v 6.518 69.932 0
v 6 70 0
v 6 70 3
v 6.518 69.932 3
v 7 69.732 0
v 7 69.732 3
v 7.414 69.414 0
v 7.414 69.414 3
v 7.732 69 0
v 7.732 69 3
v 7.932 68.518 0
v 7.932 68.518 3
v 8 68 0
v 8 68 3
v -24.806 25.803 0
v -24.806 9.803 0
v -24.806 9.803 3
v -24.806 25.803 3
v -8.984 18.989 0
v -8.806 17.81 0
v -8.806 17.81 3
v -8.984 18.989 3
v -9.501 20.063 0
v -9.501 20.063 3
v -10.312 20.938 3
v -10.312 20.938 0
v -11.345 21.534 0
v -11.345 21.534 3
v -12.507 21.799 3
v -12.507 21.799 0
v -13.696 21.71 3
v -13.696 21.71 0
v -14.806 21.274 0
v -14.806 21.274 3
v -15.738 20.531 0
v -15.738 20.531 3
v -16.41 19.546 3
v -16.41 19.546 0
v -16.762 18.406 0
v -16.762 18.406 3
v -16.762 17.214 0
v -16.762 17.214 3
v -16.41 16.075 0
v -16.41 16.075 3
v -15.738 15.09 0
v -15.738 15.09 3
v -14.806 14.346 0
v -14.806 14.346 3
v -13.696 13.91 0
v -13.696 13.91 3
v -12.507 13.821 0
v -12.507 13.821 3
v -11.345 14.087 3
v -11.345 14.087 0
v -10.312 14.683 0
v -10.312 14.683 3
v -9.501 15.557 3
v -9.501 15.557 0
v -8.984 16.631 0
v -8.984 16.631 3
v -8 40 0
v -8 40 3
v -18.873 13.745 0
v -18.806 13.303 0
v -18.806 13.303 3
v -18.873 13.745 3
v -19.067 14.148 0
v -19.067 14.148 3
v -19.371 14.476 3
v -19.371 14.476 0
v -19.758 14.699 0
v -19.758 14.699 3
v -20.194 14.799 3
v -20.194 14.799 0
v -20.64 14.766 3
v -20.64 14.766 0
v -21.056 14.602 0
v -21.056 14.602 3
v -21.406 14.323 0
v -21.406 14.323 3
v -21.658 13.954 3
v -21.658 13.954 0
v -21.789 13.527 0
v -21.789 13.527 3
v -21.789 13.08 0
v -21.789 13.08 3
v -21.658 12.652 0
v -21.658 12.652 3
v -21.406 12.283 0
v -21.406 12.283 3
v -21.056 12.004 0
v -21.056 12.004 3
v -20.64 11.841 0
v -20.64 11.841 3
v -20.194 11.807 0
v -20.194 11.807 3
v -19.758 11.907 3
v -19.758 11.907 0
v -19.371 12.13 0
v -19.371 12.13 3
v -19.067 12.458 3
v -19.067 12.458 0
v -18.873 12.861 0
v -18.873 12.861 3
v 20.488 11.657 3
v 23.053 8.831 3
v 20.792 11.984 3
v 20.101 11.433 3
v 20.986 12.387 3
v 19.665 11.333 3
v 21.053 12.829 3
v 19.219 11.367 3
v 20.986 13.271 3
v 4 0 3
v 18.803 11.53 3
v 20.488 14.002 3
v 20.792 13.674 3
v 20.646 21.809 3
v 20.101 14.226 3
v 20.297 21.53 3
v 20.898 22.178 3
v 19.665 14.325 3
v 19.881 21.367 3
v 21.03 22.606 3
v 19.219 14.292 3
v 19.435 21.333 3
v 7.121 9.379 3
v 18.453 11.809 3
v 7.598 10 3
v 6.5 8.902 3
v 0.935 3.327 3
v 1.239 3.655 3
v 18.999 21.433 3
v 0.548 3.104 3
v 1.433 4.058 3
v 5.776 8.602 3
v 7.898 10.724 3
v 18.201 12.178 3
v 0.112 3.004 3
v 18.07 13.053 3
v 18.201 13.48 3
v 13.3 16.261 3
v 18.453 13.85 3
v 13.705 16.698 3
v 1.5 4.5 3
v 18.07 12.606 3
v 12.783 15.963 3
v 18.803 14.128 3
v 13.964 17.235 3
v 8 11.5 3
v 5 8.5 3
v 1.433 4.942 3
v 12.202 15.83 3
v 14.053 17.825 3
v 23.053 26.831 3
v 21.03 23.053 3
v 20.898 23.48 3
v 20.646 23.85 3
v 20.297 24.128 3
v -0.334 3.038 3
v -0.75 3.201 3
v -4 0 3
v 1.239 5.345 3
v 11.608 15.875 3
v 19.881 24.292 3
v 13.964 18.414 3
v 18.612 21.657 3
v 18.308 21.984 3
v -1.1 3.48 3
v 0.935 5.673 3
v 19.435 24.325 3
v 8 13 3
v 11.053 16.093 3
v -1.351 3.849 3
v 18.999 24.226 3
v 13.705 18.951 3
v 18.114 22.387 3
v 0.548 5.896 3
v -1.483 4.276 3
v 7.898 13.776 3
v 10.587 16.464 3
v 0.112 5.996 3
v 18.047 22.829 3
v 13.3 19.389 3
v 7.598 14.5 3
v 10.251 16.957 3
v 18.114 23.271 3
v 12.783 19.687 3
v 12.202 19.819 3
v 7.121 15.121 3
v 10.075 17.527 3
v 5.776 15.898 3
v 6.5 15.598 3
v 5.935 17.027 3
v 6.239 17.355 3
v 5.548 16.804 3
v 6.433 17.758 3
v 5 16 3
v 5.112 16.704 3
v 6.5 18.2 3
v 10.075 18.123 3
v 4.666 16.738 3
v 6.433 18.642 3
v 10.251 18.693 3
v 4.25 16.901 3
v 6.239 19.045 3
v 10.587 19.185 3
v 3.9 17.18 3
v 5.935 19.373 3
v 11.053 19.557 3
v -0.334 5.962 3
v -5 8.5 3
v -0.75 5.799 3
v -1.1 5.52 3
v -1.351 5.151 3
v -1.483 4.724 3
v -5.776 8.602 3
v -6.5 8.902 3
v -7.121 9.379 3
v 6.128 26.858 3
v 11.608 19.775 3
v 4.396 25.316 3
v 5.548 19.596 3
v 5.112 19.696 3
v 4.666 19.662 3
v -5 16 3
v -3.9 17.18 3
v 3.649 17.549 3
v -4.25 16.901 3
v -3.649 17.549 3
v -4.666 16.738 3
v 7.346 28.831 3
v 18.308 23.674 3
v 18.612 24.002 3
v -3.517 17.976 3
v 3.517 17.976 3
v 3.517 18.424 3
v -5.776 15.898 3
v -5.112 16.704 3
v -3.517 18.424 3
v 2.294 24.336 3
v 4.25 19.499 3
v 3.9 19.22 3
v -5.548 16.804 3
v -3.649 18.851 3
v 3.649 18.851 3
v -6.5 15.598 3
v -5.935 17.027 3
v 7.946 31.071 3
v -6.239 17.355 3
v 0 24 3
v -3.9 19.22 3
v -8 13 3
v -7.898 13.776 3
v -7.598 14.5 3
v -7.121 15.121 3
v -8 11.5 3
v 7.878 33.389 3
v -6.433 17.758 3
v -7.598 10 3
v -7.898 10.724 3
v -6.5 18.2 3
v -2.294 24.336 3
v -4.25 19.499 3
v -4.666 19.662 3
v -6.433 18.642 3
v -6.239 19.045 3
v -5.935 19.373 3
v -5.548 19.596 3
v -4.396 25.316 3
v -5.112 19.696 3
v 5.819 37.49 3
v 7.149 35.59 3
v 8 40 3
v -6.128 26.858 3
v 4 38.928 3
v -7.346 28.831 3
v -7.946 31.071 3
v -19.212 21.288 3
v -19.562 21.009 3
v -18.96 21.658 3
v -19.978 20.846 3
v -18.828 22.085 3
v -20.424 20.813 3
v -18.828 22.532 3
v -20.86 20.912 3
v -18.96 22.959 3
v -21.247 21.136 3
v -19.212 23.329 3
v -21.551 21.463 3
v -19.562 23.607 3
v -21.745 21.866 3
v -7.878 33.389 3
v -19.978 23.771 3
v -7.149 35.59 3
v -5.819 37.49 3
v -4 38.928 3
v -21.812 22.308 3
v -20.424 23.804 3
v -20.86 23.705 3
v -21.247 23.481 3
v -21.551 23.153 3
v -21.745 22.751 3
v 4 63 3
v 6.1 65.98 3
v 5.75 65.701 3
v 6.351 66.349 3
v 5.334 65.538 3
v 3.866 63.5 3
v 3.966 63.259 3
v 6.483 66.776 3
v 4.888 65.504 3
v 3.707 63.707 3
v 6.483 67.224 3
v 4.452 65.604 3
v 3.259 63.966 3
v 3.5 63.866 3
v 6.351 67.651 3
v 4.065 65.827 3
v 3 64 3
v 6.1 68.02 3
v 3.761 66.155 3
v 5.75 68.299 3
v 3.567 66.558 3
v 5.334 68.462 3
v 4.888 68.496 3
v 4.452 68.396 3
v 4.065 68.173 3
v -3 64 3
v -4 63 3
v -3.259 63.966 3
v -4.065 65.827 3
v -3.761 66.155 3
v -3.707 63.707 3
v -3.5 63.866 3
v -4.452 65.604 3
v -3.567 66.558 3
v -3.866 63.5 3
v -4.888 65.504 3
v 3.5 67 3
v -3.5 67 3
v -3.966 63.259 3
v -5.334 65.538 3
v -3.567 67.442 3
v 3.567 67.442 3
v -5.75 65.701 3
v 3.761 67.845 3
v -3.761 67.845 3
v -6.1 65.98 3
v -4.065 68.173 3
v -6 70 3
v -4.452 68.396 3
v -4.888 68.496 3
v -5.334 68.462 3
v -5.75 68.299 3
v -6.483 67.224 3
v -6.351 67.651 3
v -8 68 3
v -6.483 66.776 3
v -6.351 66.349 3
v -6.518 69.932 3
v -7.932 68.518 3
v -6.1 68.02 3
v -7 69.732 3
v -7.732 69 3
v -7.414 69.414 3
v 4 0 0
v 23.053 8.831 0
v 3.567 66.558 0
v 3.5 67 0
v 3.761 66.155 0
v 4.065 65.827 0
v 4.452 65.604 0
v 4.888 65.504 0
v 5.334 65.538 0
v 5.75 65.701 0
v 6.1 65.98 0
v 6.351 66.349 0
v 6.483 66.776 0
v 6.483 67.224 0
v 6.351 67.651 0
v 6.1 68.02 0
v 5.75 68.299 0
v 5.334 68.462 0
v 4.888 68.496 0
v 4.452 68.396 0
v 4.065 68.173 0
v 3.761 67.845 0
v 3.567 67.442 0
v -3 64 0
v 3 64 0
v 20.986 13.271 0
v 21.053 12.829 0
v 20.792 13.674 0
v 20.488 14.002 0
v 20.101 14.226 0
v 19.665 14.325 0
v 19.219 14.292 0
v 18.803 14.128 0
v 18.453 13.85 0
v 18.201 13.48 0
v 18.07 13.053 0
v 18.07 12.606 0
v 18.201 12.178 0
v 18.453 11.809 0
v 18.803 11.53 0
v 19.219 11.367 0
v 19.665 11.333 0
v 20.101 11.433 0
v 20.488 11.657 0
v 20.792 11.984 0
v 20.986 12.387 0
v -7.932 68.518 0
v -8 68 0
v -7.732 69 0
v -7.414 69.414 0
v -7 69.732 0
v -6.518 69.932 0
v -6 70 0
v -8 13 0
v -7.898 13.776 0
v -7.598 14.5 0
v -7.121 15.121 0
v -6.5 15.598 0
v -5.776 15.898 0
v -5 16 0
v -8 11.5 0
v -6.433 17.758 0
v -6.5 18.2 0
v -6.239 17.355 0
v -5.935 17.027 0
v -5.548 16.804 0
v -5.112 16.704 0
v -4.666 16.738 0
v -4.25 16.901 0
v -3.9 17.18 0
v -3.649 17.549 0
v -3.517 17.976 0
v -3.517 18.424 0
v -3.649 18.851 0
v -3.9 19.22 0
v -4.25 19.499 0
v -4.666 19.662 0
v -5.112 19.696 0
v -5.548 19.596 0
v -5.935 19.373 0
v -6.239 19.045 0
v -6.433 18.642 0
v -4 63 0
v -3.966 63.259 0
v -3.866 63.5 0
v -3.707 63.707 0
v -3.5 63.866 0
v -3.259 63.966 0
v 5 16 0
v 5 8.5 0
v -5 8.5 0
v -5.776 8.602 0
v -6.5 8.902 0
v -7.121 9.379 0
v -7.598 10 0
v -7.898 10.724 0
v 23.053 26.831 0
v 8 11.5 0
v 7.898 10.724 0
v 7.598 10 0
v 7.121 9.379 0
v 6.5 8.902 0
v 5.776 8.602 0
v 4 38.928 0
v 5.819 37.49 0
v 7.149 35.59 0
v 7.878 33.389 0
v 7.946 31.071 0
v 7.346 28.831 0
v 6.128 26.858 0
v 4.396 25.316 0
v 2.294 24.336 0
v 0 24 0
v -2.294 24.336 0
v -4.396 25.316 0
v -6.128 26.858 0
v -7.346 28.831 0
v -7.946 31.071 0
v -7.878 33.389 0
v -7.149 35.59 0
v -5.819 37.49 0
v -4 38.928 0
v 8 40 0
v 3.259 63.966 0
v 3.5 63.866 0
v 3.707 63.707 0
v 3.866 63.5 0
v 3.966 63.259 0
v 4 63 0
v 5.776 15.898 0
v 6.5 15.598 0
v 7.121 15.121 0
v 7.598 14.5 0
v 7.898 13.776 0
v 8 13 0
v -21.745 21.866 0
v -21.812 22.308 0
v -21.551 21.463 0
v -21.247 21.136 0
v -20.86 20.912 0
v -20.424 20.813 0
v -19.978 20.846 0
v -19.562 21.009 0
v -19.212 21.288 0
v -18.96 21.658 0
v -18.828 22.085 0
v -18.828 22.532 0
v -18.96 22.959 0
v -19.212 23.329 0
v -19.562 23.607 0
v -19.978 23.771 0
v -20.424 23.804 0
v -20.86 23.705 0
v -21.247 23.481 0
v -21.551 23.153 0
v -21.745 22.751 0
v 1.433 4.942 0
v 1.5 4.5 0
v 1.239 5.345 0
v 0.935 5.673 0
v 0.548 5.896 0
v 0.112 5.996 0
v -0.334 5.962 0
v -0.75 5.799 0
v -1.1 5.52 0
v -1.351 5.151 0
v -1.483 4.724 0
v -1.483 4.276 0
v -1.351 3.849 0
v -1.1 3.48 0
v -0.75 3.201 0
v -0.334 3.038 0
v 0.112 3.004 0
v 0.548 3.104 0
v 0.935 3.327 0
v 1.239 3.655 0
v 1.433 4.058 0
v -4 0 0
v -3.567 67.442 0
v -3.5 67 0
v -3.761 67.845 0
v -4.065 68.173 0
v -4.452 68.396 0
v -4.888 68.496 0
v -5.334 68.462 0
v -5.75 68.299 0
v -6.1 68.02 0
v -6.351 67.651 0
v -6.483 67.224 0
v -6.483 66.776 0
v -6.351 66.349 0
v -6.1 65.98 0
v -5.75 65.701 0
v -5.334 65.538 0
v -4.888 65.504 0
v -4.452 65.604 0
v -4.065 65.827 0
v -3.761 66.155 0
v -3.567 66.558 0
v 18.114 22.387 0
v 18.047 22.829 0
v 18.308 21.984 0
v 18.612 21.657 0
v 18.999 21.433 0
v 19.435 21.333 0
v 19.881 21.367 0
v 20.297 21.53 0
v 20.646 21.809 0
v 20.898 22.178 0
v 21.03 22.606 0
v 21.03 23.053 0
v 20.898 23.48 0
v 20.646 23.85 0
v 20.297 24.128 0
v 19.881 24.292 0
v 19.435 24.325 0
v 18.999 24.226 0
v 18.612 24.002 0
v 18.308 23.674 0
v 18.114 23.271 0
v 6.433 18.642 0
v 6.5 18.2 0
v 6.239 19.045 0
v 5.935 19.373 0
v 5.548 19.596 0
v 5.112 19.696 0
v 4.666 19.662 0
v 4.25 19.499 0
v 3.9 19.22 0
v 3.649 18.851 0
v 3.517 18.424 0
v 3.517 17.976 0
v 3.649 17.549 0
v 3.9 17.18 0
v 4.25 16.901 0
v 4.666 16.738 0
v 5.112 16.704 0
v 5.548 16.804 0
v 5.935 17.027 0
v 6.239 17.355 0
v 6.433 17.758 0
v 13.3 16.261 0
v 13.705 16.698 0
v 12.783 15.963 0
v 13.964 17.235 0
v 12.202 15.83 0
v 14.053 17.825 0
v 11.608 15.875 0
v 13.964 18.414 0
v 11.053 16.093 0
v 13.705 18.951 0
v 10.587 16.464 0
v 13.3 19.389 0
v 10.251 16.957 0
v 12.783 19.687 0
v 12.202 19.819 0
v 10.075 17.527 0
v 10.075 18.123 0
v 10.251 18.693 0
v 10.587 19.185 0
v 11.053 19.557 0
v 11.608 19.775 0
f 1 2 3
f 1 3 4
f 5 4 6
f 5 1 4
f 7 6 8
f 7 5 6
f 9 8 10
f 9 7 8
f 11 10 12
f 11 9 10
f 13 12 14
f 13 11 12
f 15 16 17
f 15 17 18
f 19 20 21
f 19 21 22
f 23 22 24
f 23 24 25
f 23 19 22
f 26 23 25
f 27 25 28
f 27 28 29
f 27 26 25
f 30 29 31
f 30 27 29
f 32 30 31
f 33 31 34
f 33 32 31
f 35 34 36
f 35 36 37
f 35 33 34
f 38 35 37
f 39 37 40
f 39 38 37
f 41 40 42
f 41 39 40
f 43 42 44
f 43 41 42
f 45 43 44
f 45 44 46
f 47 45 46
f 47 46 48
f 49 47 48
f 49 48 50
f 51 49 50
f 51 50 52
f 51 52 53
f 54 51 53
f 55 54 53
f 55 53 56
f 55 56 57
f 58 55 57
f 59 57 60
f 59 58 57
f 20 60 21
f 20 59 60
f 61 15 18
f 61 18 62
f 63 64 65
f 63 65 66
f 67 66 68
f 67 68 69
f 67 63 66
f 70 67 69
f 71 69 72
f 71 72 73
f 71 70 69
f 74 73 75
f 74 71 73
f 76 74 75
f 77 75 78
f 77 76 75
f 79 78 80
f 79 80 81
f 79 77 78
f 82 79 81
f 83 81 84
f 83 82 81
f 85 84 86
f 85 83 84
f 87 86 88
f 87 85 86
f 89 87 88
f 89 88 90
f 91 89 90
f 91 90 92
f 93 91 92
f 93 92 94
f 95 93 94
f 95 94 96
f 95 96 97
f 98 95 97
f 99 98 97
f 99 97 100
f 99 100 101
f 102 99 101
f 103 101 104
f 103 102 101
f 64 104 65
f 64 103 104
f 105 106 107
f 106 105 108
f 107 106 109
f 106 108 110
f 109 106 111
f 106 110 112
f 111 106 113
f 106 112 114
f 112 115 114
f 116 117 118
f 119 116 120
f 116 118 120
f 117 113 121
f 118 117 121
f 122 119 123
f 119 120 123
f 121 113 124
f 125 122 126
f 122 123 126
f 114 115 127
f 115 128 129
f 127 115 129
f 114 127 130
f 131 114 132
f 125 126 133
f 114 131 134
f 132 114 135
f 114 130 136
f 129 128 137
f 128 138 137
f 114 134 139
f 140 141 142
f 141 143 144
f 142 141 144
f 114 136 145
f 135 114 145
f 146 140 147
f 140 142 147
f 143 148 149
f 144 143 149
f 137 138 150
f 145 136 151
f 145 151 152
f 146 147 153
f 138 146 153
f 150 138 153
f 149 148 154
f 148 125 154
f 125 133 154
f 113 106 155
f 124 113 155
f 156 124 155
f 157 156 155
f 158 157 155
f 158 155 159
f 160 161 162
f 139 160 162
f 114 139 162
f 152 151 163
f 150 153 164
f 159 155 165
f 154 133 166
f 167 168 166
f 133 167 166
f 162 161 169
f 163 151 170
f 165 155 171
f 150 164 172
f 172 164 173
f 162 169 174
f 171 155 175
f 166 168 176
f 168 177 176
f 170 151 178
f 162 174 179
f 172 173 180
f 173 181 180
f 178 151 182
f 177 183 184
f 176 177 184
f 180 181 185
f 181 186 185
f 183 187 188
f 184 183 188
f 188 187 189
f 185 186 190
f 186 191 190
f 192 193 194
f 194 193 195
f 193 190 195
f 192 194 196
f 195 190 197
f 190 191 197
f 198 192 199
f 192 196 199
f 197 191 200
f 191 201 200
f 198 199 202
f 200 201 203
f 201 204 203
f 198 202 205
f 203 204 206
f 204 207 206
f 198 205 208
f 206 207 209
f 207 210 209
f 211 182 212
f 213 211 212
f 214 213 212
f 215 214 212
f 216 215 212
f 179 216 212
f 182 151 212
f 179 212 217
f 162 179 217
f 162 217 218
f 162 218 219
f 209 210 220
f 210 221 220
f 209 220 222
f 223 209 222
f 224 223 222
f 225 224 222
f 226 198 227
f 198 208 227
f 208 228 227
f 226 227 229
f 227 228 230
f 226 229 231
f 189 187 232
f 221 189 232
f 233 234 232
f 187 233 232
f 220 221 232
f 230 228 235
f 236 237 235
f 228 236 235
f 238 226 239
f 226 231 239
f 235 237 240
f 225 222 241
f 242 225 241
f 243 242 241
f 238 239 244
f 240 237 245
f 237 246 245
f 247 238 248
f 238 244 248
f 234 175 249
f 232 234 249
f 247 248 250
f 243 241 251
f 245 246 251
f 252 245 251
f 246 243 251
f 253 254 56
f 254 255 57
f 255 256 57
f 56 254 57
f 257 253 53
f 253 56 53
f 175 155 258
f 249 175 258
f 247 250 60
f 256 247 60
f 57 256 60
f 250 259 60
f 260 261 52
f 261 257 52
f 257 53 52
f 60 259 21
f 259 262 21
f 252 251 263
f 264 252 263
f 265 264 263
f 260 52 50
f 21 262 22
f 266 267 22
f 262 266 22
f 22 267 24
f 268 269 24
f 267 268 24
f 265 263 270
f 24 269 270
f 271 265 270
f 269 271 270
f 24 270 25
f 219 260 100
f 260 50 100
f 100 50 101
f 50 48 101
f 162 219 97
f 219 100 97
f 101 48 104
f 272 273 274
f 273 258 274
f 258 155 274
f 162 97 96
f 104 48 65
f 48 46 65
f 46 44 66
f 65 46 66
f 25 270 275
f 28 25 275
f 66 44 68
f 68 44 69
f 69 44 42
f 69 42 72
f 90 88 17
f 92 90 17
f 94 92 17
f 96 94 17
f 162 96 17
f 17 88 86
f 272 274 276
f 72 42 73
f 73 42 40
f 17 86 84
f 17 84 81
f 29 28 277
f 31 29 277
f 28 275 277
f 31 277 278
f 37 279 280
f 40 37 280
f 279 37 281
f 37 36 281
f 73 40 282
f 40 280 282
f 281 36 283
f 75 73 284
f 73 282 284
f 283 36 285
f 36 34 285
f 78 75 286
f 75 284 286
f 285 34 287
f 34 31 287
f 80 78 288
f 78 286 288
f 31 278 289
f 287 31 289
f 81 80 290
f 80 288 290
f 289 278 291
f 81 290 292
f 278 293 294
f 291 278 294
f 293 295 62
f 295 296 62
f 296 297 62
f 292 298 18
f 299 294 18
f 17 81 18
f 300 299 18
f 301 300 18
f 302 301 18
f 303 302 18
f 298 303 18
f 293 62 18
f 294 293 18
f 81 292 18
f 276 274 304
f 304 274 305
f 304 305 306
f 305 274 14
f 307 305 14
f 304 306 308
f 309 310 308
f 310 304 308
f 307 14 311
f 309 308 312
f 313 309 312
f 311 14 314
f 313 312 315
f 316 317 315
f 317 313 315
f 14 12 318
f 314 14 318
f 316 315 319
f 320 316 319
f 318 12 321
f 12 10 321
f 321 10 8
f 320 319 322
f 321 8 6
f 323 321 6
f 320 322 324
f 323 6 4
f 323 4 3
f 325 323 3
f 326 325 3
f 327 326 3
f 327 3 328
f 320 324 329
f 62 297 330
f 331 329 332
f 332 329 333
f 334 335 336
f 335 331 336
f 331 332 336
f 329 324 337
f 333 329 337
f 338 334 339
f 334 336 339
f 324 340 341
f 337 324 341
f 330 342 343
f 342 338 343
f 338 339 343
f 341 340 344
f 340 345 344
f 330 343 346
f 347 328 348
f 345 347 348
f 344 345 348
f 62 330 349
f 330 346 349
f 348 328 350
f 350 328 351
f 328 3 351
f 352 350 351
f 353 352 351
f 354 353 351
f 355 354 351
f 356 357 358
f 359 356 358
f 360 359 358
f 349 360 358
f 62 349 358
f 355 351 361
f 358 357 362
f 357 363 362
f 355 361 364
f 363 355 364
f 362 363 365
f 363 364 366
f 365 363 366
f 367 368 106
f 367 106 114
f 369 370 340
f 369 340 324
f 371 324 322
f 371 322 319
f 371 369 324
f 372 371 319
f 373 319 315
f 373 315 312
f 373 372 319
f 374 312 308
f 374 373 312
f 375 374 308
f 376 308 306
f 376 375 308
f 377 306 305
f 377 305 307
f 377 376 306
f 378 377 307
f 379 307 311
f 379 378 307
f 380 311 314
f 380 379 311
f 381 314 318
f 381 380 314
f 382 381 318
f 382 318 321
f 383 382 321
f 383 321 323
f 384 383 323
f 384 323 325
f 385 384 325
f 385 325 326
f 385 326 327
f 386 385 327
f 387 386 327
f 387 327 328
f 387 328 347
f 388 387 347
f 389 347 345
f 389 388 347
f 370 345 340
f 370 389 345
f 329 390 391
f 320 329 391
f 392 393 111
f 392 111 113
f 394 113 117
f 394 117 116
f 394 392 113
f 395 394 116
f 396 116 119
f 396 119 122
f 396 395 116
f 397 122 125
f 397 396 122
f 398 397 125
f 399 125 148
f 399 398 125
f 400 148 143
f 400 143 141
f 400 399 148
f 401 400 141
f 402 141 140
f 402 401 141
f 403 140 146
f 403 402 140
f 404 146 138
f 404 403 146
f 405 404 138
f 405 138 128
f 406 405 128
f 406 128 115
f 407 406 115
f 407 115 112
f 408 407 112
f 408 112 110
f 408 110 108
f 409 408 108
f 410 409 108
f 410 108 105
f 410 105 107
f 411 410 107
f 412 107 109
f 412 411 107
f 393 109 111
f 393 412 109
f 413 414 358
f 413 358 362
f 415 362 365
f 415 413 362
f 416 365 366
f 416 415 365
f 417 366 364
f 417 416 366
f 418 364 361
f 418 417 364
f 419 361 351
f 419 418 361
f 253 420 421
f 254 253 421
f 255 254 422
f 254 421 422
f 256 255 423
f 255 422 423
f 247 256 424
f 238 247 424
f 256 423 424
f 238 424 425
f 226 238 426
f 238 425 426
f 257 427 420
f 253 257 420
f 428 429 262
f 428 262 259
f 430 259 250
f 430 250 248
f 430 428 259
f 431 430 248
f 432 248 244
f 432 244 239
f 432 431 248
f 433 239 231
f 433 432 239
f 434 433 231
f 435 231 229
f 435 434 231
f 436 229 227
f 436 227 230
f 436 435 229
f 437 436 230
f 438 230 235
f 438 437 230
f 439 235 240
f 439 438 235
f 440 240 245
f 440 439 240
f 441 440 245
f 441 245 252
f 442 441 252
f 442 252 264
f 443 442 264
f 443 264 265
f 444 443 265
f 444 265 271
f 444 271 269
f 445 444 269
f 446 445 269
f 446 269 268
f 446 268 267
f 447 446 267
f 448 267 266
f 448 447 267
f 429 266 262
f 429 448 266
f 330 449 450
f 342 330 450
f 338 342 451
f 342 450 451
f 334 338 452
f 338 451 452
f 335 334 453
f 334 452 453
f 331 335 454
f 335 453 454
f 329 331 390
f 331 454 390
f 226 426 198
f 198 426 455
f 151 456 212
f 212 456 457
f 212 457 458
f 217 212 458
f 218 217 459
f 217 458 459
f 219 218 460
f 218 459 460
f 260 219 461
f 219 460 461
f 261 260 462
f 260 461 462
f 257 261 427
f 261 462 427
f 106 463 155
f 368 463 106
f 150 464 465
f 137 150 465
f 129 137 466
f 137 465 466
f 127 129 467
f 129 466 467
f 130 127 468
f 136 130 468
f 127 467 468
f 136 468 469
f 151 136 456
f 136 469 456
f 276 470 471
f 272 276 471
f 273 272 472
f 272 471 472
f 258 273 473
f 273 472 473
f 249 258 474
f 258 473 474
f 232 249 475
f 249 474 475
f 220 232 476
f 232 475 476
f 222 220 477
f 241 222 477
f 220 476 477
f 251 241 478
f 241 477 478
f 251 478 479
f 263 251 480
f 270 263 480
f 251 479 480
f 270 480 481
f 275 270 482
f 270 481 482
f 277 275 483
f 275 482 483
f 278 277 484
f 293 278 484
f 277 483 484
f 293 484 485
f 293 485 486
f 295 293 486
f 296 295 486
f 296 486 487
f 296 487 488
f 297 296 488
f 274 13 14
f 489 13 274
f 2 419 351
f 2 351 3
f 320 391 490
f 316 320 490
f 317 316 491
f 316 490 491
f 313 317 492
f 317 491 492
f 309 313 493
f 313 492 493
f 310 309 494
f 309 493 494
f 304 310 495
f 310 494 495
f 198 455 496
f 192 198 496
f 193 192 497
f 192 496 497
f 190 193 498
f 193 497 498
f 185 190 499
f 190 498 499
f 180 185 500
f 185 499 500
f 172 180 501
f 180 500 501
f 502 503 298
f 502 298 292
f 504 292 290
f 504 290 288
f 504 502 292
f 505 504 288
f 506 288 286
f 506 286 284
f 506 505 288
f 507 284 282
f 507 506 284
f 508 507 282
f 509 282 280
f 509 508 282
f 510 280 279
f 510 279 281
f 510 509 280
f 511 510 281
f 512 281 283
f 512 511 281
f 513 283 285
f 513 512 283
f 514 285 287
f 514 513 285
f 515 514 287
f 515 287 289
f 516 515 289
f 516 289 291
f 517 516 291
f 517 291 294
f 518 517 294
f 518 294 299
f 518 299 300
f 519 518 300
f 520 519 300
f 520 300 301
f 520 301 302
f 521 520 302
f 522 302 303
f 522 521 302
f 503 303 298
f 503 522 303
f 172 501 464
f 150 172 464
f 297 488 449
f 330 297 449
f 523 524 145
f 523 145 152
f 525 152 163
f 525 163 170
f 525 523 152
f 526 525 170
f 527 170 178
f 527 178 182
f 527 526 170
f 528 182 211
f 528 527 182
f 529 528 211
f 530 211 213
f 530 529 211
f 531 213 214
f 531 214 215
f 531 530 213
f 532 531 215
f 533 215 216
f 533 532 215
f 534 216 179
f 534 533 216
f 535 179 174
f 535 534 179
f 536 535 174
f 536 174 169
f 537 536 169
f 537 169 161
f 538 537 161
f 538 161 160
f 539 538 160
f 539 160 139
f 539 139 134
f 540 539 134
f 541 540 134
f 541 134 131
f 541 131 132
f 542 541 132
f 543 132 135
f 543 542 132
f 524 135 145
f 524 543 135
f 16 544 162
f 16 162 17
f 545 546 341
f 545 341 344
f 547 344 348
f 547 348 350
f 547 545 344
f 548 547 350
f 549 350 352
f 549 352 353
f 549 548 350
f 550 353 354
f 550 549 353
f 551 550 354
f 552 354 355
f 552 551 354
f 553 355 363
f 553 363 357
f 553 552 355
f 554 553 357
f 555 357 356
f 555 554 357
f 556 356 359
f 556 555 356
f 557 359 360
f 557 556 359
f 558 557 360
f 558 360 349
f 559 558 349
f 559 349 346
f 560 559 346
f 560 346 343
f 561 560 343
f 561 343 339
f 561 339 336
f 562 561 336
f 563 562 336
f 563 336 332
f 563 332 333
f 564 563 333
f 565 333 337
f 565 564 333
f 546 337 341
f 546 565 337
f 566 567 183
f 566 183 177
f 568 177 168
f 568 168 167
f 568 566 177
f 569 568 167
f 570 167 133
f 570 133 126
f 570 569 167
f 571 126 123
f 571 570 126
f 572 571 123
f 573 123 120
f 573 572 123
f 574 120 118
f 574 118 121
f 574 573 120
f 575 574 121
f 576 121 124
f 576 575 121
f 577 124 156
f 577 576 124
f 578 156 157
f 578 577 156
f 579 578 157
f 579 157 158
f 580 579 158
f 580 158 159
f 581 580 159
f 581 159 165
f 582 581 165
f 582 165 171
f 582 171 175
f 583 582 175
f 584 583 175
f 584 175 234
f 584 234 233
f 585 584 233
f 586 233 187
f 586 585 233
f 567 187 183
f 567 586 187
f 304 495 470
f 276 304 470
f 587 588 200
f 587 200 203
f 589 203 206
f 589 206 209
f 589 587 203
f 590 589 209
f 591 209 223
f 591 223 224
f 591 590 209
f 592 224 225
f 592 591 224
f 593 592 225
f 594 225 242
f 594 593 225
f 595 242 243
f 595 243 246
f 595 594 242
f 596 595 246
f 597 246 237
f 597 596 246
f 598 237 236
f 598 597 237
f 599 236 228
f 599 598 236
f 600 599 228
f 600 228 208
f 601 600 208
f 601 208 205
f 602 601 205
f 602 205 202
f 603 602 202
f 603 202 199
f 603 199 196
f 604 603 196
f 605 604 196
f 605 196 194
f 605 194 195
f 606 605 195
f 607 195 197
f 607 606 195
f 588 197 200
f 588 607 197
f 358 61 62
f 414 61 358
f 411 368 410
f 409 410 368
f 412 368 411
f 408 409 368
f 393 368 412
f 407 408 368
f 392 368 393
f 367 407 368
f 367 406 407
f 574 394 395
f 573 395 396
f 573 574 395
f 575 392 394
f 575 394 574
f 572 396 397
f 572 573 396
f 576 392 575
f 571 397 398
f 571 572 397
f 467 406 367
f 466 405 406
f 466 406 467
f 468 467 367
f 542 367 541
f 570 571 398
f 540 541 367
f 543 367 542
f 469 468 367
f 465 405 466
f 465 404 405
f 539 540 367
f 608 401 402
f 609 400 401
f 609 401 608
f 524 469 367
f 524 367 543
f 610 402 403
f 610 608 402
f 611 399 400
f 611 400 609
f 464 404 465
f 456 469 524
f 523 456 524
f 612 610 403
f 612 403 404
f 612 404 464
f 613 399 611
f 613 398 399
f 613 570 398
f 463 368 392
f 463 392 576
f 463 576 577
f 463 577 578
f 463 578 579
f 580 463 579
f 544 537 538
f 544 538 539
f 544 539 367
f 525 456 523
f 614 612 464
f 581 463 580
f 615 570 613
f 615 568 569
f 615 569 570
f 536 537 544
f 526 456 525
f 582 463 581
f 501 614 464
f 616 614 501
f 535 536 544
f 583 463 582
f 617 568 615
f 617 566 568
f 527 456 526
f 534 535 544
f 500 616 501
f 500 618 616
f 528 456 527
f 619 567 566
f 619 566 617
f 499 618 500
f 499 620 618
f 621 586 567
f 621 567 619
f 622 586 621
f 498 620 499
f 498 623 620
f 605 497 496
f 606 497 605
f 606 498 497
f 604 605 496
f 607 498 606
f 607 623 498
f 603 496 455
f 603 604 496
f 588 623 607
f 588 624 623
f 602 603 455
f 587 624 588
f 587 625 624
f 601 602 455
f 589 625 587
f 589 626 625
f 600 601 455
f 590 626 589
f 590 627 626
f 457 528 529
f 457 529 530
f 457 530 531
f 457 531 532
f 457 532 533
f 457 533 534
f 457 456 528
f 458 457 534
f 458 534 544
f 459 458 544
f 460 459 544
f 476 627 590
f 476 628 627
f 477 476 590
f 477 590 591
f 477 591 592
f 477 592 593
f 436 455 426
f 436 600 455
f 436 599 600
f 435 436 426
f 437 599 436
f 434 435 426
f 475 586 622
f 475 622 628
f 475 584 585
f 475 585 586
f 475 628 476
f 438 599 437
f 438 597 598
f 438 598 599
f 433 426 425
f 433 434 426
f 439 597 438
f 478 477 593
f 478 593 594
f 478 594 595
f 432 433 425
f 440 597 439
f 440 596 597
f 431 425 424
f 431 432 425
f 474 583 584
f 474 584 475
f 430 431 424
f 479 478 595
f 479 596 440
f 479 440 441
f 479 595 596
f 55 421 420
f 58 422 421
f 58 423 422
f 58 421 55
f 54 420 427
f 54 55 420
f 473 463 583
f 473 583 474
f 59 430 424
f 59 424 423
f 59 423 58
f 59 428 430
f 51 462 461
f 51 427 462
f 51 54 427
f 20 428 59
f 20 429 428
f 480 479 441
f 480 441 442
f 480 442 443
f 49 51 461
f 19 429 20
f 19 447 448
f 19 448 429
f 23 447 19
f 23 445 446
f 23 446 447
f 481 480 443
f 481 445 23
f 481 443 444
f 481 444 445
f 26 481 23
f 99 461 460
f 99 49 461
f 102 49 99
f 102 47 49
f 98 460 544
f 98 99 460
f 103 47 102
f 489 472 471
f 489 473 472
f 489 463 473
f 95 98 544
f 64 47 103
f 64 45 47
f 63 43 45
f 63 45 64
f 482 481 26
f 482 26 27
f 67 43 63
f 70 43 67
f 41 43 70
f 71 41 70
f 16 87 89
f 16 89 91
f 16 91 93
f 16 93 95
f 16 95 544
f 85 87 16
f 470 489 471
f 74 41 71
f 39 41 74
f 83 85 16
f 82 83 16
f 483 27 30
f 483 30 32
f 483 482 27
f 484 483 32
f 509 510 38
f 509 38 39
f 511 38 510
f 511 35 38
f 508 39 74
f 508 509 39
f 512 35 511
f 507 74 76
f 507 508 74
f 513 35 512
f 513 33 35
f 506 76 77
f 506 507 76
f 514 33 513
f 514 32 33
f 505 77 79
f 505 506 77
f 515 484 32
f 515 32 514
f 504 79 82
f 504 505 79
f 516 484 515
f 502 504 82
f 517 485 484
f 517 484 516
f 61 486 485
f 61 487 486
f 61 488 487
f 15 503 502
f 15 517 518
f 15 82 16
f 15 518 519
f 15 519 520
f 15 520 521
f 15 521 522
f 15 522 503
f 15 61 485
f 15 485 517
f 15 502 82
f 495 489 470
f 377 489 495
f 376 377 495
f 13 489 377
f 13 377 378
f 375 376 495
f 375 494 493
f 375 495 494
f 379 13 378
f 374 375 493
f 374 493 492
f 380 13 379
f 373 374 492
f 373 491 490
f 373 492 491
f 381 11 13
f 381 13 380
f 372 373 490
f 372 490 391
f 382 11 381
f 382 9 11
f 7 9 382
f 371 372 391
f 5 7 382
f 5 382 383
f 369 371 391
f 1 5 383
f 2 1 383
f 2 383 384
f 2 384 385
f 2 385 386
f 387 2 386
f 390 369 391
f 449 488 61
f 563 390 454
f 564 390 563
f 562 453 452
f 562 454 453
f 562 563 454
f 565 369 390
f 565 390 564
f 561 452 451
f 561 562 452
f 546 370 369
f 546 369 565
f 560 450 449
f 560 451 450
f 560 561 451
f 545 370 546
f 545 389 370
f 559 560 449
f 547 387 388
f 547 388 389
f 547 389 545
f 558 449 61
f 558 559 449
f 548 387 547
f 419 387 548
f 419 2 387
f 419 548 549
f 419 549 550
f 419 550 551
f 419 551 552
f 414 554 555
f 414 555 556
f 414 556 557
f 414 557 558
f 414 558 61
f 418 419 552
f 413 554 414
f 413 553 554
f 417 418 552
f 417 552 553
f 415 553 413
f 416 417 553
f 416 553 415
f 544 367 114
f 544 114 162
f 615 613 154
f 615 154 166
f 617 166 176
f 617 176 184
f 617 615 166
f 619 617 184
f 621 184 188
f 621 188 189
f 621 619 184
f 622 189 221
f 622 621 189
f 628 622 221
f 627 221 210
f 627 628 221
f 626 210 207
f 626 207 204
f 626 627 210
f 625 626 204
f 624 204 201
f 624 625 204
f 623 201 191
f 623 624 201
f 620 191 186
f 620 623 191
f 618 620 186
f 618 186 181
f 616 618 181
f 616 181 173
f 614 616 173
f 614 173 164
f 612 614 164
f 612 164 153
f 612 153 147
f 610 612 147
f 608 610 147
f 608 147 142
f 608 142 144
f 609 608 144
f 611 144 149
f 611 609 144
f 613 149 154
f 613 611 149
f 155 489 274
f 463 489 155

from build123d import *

# Parameters (mm, degrees)
SKETCH1_R           = 1.5
SKETCH1_R_2         = 4
SKETCH1_R_3         = 2
BOSS_EXTRUDE1_DEPTH = 3


with BuildPart() as part:
    # Sketch1 → Boss-Extrude1 (new body)
    with BuildSketch(Plane.XY):
        with BuildLine():
            Line((-6, 70), (6, 70))
            ThreePointArc((6, 70), (7.414213562, 69.414213562), (8, 68))
            Line((8, 68), (8, 40))
            Line((8, 40), (23.052765378, 26.831315386))
            Line((23.052765378, 26.831315386), (23.052765378, 8.831315386))
            Line((23.052765378, 8.831315386), (4, 0))
            Line((4, 0), (-4, 0))
            Line((-4, 0), (-24.806216128, 9.803130645))
            Line((-24.806216128, 9.803130645), (-24.806216128, 25.803130645))
            Line((-24.806216128, 25.803130645), (-8, 40))
            Line((-8, 40), (-8, 68))
            ThreePointArc((-8, 68), (-7.414213562, 69.414213562), (-6, 70))
        make_face()
        with Locations((0, 4.5)):
            Circle(SKETCH1_R, mode=Mode.SUBTRACT)
        with Locations((-20.306216128, 13.303130645)):
            Circle(SKETCH1_R, mode=Mode.SUBTRACT)
        with Locations(Location((-20.311519457, 22.308427732, 0), (0, 0, 180))):
            Circle(SKETCH1_R, mode=Mode.SUBTRACT)
        with Locations((-12.806216128, 17.810197592)):
            Circle(SKETCH1_R_2, mode=Mode.SUBTRACT)
        with Locations((-5, 67)):
            Circle(SKETCH1_R, mode=Mode.SUBTRACT)
        with Locations(Location((5, 67, 0), (0, 0, 180))):
            Circle(SKETCH1_R, mode=Mode.SUBTRACT)
        with Locations((5, 18.2)):
            Circle(SKETCH1_R, mode=Mode.SUBTRACT)
        with Locations(Location((-5, 18.2, 0), (0, 0, 180))):
            Circle(SKETCH1_R, mode=Mode.SUBTRACT)
        with Locations((19.552765378, 12.829253326)):
            Circle(SKETCH1_R, mode=Mode.SUBTRACT)
        with Locations(Location((19.546876257, 22.829251592, 0), (0, 0, 180))):
            Circle(SKETCH1_R, mode=Mode.SUBTRACT)
        with Locations((12.052765378, 17.824837351)):
            Circle(SKETCH1_R_3, mode=Mode.SUBTRACT)
        with BuildLine():
            Line((-3, 64), (3, 64))
            ThreePointArc((3, 64), (3.707106781, 63.707106781), (4, 63))
            Line((4, 63), (4, 38.92820323))
            ThreePointArc((4, 38.92820323), (0, 24), (-4, 38.92820323))
            Line((-4, 38.92820323), (-4, 63))
            ThreePointArc((-4, 63), (-3.707106781, 63.707106781), (-3, 64))
        make_face(mode=Mode.SUBTRACT)
        with BuildLine():
            Line((-5, 16), (5, 16))
            ThreePointArc((5, 16), (7.121320344, 15.121320344), (8, 13))
            Line((8, 13), (8, 11.5))
            ThreePointArc((8, 11.5), (7.121320344, 9.378679656), (5, 8.5))
            Line((5, 8.5), (-5, 8.5))
            ThreePointArc((-5, 8.5), (-7.121320344, 9.378679656), (-8, 11.5))
            Line((-8, 11.5), (-8, 13))
            ThreePointArc((-8, 13), (-7.121320344, 15.121320344), (-5, 16))
        make_face(mode=Mode.SUBTRACT)
    extrude(amount=BOSS_EXTRUDE1_DEPTH)


solid = part.part
